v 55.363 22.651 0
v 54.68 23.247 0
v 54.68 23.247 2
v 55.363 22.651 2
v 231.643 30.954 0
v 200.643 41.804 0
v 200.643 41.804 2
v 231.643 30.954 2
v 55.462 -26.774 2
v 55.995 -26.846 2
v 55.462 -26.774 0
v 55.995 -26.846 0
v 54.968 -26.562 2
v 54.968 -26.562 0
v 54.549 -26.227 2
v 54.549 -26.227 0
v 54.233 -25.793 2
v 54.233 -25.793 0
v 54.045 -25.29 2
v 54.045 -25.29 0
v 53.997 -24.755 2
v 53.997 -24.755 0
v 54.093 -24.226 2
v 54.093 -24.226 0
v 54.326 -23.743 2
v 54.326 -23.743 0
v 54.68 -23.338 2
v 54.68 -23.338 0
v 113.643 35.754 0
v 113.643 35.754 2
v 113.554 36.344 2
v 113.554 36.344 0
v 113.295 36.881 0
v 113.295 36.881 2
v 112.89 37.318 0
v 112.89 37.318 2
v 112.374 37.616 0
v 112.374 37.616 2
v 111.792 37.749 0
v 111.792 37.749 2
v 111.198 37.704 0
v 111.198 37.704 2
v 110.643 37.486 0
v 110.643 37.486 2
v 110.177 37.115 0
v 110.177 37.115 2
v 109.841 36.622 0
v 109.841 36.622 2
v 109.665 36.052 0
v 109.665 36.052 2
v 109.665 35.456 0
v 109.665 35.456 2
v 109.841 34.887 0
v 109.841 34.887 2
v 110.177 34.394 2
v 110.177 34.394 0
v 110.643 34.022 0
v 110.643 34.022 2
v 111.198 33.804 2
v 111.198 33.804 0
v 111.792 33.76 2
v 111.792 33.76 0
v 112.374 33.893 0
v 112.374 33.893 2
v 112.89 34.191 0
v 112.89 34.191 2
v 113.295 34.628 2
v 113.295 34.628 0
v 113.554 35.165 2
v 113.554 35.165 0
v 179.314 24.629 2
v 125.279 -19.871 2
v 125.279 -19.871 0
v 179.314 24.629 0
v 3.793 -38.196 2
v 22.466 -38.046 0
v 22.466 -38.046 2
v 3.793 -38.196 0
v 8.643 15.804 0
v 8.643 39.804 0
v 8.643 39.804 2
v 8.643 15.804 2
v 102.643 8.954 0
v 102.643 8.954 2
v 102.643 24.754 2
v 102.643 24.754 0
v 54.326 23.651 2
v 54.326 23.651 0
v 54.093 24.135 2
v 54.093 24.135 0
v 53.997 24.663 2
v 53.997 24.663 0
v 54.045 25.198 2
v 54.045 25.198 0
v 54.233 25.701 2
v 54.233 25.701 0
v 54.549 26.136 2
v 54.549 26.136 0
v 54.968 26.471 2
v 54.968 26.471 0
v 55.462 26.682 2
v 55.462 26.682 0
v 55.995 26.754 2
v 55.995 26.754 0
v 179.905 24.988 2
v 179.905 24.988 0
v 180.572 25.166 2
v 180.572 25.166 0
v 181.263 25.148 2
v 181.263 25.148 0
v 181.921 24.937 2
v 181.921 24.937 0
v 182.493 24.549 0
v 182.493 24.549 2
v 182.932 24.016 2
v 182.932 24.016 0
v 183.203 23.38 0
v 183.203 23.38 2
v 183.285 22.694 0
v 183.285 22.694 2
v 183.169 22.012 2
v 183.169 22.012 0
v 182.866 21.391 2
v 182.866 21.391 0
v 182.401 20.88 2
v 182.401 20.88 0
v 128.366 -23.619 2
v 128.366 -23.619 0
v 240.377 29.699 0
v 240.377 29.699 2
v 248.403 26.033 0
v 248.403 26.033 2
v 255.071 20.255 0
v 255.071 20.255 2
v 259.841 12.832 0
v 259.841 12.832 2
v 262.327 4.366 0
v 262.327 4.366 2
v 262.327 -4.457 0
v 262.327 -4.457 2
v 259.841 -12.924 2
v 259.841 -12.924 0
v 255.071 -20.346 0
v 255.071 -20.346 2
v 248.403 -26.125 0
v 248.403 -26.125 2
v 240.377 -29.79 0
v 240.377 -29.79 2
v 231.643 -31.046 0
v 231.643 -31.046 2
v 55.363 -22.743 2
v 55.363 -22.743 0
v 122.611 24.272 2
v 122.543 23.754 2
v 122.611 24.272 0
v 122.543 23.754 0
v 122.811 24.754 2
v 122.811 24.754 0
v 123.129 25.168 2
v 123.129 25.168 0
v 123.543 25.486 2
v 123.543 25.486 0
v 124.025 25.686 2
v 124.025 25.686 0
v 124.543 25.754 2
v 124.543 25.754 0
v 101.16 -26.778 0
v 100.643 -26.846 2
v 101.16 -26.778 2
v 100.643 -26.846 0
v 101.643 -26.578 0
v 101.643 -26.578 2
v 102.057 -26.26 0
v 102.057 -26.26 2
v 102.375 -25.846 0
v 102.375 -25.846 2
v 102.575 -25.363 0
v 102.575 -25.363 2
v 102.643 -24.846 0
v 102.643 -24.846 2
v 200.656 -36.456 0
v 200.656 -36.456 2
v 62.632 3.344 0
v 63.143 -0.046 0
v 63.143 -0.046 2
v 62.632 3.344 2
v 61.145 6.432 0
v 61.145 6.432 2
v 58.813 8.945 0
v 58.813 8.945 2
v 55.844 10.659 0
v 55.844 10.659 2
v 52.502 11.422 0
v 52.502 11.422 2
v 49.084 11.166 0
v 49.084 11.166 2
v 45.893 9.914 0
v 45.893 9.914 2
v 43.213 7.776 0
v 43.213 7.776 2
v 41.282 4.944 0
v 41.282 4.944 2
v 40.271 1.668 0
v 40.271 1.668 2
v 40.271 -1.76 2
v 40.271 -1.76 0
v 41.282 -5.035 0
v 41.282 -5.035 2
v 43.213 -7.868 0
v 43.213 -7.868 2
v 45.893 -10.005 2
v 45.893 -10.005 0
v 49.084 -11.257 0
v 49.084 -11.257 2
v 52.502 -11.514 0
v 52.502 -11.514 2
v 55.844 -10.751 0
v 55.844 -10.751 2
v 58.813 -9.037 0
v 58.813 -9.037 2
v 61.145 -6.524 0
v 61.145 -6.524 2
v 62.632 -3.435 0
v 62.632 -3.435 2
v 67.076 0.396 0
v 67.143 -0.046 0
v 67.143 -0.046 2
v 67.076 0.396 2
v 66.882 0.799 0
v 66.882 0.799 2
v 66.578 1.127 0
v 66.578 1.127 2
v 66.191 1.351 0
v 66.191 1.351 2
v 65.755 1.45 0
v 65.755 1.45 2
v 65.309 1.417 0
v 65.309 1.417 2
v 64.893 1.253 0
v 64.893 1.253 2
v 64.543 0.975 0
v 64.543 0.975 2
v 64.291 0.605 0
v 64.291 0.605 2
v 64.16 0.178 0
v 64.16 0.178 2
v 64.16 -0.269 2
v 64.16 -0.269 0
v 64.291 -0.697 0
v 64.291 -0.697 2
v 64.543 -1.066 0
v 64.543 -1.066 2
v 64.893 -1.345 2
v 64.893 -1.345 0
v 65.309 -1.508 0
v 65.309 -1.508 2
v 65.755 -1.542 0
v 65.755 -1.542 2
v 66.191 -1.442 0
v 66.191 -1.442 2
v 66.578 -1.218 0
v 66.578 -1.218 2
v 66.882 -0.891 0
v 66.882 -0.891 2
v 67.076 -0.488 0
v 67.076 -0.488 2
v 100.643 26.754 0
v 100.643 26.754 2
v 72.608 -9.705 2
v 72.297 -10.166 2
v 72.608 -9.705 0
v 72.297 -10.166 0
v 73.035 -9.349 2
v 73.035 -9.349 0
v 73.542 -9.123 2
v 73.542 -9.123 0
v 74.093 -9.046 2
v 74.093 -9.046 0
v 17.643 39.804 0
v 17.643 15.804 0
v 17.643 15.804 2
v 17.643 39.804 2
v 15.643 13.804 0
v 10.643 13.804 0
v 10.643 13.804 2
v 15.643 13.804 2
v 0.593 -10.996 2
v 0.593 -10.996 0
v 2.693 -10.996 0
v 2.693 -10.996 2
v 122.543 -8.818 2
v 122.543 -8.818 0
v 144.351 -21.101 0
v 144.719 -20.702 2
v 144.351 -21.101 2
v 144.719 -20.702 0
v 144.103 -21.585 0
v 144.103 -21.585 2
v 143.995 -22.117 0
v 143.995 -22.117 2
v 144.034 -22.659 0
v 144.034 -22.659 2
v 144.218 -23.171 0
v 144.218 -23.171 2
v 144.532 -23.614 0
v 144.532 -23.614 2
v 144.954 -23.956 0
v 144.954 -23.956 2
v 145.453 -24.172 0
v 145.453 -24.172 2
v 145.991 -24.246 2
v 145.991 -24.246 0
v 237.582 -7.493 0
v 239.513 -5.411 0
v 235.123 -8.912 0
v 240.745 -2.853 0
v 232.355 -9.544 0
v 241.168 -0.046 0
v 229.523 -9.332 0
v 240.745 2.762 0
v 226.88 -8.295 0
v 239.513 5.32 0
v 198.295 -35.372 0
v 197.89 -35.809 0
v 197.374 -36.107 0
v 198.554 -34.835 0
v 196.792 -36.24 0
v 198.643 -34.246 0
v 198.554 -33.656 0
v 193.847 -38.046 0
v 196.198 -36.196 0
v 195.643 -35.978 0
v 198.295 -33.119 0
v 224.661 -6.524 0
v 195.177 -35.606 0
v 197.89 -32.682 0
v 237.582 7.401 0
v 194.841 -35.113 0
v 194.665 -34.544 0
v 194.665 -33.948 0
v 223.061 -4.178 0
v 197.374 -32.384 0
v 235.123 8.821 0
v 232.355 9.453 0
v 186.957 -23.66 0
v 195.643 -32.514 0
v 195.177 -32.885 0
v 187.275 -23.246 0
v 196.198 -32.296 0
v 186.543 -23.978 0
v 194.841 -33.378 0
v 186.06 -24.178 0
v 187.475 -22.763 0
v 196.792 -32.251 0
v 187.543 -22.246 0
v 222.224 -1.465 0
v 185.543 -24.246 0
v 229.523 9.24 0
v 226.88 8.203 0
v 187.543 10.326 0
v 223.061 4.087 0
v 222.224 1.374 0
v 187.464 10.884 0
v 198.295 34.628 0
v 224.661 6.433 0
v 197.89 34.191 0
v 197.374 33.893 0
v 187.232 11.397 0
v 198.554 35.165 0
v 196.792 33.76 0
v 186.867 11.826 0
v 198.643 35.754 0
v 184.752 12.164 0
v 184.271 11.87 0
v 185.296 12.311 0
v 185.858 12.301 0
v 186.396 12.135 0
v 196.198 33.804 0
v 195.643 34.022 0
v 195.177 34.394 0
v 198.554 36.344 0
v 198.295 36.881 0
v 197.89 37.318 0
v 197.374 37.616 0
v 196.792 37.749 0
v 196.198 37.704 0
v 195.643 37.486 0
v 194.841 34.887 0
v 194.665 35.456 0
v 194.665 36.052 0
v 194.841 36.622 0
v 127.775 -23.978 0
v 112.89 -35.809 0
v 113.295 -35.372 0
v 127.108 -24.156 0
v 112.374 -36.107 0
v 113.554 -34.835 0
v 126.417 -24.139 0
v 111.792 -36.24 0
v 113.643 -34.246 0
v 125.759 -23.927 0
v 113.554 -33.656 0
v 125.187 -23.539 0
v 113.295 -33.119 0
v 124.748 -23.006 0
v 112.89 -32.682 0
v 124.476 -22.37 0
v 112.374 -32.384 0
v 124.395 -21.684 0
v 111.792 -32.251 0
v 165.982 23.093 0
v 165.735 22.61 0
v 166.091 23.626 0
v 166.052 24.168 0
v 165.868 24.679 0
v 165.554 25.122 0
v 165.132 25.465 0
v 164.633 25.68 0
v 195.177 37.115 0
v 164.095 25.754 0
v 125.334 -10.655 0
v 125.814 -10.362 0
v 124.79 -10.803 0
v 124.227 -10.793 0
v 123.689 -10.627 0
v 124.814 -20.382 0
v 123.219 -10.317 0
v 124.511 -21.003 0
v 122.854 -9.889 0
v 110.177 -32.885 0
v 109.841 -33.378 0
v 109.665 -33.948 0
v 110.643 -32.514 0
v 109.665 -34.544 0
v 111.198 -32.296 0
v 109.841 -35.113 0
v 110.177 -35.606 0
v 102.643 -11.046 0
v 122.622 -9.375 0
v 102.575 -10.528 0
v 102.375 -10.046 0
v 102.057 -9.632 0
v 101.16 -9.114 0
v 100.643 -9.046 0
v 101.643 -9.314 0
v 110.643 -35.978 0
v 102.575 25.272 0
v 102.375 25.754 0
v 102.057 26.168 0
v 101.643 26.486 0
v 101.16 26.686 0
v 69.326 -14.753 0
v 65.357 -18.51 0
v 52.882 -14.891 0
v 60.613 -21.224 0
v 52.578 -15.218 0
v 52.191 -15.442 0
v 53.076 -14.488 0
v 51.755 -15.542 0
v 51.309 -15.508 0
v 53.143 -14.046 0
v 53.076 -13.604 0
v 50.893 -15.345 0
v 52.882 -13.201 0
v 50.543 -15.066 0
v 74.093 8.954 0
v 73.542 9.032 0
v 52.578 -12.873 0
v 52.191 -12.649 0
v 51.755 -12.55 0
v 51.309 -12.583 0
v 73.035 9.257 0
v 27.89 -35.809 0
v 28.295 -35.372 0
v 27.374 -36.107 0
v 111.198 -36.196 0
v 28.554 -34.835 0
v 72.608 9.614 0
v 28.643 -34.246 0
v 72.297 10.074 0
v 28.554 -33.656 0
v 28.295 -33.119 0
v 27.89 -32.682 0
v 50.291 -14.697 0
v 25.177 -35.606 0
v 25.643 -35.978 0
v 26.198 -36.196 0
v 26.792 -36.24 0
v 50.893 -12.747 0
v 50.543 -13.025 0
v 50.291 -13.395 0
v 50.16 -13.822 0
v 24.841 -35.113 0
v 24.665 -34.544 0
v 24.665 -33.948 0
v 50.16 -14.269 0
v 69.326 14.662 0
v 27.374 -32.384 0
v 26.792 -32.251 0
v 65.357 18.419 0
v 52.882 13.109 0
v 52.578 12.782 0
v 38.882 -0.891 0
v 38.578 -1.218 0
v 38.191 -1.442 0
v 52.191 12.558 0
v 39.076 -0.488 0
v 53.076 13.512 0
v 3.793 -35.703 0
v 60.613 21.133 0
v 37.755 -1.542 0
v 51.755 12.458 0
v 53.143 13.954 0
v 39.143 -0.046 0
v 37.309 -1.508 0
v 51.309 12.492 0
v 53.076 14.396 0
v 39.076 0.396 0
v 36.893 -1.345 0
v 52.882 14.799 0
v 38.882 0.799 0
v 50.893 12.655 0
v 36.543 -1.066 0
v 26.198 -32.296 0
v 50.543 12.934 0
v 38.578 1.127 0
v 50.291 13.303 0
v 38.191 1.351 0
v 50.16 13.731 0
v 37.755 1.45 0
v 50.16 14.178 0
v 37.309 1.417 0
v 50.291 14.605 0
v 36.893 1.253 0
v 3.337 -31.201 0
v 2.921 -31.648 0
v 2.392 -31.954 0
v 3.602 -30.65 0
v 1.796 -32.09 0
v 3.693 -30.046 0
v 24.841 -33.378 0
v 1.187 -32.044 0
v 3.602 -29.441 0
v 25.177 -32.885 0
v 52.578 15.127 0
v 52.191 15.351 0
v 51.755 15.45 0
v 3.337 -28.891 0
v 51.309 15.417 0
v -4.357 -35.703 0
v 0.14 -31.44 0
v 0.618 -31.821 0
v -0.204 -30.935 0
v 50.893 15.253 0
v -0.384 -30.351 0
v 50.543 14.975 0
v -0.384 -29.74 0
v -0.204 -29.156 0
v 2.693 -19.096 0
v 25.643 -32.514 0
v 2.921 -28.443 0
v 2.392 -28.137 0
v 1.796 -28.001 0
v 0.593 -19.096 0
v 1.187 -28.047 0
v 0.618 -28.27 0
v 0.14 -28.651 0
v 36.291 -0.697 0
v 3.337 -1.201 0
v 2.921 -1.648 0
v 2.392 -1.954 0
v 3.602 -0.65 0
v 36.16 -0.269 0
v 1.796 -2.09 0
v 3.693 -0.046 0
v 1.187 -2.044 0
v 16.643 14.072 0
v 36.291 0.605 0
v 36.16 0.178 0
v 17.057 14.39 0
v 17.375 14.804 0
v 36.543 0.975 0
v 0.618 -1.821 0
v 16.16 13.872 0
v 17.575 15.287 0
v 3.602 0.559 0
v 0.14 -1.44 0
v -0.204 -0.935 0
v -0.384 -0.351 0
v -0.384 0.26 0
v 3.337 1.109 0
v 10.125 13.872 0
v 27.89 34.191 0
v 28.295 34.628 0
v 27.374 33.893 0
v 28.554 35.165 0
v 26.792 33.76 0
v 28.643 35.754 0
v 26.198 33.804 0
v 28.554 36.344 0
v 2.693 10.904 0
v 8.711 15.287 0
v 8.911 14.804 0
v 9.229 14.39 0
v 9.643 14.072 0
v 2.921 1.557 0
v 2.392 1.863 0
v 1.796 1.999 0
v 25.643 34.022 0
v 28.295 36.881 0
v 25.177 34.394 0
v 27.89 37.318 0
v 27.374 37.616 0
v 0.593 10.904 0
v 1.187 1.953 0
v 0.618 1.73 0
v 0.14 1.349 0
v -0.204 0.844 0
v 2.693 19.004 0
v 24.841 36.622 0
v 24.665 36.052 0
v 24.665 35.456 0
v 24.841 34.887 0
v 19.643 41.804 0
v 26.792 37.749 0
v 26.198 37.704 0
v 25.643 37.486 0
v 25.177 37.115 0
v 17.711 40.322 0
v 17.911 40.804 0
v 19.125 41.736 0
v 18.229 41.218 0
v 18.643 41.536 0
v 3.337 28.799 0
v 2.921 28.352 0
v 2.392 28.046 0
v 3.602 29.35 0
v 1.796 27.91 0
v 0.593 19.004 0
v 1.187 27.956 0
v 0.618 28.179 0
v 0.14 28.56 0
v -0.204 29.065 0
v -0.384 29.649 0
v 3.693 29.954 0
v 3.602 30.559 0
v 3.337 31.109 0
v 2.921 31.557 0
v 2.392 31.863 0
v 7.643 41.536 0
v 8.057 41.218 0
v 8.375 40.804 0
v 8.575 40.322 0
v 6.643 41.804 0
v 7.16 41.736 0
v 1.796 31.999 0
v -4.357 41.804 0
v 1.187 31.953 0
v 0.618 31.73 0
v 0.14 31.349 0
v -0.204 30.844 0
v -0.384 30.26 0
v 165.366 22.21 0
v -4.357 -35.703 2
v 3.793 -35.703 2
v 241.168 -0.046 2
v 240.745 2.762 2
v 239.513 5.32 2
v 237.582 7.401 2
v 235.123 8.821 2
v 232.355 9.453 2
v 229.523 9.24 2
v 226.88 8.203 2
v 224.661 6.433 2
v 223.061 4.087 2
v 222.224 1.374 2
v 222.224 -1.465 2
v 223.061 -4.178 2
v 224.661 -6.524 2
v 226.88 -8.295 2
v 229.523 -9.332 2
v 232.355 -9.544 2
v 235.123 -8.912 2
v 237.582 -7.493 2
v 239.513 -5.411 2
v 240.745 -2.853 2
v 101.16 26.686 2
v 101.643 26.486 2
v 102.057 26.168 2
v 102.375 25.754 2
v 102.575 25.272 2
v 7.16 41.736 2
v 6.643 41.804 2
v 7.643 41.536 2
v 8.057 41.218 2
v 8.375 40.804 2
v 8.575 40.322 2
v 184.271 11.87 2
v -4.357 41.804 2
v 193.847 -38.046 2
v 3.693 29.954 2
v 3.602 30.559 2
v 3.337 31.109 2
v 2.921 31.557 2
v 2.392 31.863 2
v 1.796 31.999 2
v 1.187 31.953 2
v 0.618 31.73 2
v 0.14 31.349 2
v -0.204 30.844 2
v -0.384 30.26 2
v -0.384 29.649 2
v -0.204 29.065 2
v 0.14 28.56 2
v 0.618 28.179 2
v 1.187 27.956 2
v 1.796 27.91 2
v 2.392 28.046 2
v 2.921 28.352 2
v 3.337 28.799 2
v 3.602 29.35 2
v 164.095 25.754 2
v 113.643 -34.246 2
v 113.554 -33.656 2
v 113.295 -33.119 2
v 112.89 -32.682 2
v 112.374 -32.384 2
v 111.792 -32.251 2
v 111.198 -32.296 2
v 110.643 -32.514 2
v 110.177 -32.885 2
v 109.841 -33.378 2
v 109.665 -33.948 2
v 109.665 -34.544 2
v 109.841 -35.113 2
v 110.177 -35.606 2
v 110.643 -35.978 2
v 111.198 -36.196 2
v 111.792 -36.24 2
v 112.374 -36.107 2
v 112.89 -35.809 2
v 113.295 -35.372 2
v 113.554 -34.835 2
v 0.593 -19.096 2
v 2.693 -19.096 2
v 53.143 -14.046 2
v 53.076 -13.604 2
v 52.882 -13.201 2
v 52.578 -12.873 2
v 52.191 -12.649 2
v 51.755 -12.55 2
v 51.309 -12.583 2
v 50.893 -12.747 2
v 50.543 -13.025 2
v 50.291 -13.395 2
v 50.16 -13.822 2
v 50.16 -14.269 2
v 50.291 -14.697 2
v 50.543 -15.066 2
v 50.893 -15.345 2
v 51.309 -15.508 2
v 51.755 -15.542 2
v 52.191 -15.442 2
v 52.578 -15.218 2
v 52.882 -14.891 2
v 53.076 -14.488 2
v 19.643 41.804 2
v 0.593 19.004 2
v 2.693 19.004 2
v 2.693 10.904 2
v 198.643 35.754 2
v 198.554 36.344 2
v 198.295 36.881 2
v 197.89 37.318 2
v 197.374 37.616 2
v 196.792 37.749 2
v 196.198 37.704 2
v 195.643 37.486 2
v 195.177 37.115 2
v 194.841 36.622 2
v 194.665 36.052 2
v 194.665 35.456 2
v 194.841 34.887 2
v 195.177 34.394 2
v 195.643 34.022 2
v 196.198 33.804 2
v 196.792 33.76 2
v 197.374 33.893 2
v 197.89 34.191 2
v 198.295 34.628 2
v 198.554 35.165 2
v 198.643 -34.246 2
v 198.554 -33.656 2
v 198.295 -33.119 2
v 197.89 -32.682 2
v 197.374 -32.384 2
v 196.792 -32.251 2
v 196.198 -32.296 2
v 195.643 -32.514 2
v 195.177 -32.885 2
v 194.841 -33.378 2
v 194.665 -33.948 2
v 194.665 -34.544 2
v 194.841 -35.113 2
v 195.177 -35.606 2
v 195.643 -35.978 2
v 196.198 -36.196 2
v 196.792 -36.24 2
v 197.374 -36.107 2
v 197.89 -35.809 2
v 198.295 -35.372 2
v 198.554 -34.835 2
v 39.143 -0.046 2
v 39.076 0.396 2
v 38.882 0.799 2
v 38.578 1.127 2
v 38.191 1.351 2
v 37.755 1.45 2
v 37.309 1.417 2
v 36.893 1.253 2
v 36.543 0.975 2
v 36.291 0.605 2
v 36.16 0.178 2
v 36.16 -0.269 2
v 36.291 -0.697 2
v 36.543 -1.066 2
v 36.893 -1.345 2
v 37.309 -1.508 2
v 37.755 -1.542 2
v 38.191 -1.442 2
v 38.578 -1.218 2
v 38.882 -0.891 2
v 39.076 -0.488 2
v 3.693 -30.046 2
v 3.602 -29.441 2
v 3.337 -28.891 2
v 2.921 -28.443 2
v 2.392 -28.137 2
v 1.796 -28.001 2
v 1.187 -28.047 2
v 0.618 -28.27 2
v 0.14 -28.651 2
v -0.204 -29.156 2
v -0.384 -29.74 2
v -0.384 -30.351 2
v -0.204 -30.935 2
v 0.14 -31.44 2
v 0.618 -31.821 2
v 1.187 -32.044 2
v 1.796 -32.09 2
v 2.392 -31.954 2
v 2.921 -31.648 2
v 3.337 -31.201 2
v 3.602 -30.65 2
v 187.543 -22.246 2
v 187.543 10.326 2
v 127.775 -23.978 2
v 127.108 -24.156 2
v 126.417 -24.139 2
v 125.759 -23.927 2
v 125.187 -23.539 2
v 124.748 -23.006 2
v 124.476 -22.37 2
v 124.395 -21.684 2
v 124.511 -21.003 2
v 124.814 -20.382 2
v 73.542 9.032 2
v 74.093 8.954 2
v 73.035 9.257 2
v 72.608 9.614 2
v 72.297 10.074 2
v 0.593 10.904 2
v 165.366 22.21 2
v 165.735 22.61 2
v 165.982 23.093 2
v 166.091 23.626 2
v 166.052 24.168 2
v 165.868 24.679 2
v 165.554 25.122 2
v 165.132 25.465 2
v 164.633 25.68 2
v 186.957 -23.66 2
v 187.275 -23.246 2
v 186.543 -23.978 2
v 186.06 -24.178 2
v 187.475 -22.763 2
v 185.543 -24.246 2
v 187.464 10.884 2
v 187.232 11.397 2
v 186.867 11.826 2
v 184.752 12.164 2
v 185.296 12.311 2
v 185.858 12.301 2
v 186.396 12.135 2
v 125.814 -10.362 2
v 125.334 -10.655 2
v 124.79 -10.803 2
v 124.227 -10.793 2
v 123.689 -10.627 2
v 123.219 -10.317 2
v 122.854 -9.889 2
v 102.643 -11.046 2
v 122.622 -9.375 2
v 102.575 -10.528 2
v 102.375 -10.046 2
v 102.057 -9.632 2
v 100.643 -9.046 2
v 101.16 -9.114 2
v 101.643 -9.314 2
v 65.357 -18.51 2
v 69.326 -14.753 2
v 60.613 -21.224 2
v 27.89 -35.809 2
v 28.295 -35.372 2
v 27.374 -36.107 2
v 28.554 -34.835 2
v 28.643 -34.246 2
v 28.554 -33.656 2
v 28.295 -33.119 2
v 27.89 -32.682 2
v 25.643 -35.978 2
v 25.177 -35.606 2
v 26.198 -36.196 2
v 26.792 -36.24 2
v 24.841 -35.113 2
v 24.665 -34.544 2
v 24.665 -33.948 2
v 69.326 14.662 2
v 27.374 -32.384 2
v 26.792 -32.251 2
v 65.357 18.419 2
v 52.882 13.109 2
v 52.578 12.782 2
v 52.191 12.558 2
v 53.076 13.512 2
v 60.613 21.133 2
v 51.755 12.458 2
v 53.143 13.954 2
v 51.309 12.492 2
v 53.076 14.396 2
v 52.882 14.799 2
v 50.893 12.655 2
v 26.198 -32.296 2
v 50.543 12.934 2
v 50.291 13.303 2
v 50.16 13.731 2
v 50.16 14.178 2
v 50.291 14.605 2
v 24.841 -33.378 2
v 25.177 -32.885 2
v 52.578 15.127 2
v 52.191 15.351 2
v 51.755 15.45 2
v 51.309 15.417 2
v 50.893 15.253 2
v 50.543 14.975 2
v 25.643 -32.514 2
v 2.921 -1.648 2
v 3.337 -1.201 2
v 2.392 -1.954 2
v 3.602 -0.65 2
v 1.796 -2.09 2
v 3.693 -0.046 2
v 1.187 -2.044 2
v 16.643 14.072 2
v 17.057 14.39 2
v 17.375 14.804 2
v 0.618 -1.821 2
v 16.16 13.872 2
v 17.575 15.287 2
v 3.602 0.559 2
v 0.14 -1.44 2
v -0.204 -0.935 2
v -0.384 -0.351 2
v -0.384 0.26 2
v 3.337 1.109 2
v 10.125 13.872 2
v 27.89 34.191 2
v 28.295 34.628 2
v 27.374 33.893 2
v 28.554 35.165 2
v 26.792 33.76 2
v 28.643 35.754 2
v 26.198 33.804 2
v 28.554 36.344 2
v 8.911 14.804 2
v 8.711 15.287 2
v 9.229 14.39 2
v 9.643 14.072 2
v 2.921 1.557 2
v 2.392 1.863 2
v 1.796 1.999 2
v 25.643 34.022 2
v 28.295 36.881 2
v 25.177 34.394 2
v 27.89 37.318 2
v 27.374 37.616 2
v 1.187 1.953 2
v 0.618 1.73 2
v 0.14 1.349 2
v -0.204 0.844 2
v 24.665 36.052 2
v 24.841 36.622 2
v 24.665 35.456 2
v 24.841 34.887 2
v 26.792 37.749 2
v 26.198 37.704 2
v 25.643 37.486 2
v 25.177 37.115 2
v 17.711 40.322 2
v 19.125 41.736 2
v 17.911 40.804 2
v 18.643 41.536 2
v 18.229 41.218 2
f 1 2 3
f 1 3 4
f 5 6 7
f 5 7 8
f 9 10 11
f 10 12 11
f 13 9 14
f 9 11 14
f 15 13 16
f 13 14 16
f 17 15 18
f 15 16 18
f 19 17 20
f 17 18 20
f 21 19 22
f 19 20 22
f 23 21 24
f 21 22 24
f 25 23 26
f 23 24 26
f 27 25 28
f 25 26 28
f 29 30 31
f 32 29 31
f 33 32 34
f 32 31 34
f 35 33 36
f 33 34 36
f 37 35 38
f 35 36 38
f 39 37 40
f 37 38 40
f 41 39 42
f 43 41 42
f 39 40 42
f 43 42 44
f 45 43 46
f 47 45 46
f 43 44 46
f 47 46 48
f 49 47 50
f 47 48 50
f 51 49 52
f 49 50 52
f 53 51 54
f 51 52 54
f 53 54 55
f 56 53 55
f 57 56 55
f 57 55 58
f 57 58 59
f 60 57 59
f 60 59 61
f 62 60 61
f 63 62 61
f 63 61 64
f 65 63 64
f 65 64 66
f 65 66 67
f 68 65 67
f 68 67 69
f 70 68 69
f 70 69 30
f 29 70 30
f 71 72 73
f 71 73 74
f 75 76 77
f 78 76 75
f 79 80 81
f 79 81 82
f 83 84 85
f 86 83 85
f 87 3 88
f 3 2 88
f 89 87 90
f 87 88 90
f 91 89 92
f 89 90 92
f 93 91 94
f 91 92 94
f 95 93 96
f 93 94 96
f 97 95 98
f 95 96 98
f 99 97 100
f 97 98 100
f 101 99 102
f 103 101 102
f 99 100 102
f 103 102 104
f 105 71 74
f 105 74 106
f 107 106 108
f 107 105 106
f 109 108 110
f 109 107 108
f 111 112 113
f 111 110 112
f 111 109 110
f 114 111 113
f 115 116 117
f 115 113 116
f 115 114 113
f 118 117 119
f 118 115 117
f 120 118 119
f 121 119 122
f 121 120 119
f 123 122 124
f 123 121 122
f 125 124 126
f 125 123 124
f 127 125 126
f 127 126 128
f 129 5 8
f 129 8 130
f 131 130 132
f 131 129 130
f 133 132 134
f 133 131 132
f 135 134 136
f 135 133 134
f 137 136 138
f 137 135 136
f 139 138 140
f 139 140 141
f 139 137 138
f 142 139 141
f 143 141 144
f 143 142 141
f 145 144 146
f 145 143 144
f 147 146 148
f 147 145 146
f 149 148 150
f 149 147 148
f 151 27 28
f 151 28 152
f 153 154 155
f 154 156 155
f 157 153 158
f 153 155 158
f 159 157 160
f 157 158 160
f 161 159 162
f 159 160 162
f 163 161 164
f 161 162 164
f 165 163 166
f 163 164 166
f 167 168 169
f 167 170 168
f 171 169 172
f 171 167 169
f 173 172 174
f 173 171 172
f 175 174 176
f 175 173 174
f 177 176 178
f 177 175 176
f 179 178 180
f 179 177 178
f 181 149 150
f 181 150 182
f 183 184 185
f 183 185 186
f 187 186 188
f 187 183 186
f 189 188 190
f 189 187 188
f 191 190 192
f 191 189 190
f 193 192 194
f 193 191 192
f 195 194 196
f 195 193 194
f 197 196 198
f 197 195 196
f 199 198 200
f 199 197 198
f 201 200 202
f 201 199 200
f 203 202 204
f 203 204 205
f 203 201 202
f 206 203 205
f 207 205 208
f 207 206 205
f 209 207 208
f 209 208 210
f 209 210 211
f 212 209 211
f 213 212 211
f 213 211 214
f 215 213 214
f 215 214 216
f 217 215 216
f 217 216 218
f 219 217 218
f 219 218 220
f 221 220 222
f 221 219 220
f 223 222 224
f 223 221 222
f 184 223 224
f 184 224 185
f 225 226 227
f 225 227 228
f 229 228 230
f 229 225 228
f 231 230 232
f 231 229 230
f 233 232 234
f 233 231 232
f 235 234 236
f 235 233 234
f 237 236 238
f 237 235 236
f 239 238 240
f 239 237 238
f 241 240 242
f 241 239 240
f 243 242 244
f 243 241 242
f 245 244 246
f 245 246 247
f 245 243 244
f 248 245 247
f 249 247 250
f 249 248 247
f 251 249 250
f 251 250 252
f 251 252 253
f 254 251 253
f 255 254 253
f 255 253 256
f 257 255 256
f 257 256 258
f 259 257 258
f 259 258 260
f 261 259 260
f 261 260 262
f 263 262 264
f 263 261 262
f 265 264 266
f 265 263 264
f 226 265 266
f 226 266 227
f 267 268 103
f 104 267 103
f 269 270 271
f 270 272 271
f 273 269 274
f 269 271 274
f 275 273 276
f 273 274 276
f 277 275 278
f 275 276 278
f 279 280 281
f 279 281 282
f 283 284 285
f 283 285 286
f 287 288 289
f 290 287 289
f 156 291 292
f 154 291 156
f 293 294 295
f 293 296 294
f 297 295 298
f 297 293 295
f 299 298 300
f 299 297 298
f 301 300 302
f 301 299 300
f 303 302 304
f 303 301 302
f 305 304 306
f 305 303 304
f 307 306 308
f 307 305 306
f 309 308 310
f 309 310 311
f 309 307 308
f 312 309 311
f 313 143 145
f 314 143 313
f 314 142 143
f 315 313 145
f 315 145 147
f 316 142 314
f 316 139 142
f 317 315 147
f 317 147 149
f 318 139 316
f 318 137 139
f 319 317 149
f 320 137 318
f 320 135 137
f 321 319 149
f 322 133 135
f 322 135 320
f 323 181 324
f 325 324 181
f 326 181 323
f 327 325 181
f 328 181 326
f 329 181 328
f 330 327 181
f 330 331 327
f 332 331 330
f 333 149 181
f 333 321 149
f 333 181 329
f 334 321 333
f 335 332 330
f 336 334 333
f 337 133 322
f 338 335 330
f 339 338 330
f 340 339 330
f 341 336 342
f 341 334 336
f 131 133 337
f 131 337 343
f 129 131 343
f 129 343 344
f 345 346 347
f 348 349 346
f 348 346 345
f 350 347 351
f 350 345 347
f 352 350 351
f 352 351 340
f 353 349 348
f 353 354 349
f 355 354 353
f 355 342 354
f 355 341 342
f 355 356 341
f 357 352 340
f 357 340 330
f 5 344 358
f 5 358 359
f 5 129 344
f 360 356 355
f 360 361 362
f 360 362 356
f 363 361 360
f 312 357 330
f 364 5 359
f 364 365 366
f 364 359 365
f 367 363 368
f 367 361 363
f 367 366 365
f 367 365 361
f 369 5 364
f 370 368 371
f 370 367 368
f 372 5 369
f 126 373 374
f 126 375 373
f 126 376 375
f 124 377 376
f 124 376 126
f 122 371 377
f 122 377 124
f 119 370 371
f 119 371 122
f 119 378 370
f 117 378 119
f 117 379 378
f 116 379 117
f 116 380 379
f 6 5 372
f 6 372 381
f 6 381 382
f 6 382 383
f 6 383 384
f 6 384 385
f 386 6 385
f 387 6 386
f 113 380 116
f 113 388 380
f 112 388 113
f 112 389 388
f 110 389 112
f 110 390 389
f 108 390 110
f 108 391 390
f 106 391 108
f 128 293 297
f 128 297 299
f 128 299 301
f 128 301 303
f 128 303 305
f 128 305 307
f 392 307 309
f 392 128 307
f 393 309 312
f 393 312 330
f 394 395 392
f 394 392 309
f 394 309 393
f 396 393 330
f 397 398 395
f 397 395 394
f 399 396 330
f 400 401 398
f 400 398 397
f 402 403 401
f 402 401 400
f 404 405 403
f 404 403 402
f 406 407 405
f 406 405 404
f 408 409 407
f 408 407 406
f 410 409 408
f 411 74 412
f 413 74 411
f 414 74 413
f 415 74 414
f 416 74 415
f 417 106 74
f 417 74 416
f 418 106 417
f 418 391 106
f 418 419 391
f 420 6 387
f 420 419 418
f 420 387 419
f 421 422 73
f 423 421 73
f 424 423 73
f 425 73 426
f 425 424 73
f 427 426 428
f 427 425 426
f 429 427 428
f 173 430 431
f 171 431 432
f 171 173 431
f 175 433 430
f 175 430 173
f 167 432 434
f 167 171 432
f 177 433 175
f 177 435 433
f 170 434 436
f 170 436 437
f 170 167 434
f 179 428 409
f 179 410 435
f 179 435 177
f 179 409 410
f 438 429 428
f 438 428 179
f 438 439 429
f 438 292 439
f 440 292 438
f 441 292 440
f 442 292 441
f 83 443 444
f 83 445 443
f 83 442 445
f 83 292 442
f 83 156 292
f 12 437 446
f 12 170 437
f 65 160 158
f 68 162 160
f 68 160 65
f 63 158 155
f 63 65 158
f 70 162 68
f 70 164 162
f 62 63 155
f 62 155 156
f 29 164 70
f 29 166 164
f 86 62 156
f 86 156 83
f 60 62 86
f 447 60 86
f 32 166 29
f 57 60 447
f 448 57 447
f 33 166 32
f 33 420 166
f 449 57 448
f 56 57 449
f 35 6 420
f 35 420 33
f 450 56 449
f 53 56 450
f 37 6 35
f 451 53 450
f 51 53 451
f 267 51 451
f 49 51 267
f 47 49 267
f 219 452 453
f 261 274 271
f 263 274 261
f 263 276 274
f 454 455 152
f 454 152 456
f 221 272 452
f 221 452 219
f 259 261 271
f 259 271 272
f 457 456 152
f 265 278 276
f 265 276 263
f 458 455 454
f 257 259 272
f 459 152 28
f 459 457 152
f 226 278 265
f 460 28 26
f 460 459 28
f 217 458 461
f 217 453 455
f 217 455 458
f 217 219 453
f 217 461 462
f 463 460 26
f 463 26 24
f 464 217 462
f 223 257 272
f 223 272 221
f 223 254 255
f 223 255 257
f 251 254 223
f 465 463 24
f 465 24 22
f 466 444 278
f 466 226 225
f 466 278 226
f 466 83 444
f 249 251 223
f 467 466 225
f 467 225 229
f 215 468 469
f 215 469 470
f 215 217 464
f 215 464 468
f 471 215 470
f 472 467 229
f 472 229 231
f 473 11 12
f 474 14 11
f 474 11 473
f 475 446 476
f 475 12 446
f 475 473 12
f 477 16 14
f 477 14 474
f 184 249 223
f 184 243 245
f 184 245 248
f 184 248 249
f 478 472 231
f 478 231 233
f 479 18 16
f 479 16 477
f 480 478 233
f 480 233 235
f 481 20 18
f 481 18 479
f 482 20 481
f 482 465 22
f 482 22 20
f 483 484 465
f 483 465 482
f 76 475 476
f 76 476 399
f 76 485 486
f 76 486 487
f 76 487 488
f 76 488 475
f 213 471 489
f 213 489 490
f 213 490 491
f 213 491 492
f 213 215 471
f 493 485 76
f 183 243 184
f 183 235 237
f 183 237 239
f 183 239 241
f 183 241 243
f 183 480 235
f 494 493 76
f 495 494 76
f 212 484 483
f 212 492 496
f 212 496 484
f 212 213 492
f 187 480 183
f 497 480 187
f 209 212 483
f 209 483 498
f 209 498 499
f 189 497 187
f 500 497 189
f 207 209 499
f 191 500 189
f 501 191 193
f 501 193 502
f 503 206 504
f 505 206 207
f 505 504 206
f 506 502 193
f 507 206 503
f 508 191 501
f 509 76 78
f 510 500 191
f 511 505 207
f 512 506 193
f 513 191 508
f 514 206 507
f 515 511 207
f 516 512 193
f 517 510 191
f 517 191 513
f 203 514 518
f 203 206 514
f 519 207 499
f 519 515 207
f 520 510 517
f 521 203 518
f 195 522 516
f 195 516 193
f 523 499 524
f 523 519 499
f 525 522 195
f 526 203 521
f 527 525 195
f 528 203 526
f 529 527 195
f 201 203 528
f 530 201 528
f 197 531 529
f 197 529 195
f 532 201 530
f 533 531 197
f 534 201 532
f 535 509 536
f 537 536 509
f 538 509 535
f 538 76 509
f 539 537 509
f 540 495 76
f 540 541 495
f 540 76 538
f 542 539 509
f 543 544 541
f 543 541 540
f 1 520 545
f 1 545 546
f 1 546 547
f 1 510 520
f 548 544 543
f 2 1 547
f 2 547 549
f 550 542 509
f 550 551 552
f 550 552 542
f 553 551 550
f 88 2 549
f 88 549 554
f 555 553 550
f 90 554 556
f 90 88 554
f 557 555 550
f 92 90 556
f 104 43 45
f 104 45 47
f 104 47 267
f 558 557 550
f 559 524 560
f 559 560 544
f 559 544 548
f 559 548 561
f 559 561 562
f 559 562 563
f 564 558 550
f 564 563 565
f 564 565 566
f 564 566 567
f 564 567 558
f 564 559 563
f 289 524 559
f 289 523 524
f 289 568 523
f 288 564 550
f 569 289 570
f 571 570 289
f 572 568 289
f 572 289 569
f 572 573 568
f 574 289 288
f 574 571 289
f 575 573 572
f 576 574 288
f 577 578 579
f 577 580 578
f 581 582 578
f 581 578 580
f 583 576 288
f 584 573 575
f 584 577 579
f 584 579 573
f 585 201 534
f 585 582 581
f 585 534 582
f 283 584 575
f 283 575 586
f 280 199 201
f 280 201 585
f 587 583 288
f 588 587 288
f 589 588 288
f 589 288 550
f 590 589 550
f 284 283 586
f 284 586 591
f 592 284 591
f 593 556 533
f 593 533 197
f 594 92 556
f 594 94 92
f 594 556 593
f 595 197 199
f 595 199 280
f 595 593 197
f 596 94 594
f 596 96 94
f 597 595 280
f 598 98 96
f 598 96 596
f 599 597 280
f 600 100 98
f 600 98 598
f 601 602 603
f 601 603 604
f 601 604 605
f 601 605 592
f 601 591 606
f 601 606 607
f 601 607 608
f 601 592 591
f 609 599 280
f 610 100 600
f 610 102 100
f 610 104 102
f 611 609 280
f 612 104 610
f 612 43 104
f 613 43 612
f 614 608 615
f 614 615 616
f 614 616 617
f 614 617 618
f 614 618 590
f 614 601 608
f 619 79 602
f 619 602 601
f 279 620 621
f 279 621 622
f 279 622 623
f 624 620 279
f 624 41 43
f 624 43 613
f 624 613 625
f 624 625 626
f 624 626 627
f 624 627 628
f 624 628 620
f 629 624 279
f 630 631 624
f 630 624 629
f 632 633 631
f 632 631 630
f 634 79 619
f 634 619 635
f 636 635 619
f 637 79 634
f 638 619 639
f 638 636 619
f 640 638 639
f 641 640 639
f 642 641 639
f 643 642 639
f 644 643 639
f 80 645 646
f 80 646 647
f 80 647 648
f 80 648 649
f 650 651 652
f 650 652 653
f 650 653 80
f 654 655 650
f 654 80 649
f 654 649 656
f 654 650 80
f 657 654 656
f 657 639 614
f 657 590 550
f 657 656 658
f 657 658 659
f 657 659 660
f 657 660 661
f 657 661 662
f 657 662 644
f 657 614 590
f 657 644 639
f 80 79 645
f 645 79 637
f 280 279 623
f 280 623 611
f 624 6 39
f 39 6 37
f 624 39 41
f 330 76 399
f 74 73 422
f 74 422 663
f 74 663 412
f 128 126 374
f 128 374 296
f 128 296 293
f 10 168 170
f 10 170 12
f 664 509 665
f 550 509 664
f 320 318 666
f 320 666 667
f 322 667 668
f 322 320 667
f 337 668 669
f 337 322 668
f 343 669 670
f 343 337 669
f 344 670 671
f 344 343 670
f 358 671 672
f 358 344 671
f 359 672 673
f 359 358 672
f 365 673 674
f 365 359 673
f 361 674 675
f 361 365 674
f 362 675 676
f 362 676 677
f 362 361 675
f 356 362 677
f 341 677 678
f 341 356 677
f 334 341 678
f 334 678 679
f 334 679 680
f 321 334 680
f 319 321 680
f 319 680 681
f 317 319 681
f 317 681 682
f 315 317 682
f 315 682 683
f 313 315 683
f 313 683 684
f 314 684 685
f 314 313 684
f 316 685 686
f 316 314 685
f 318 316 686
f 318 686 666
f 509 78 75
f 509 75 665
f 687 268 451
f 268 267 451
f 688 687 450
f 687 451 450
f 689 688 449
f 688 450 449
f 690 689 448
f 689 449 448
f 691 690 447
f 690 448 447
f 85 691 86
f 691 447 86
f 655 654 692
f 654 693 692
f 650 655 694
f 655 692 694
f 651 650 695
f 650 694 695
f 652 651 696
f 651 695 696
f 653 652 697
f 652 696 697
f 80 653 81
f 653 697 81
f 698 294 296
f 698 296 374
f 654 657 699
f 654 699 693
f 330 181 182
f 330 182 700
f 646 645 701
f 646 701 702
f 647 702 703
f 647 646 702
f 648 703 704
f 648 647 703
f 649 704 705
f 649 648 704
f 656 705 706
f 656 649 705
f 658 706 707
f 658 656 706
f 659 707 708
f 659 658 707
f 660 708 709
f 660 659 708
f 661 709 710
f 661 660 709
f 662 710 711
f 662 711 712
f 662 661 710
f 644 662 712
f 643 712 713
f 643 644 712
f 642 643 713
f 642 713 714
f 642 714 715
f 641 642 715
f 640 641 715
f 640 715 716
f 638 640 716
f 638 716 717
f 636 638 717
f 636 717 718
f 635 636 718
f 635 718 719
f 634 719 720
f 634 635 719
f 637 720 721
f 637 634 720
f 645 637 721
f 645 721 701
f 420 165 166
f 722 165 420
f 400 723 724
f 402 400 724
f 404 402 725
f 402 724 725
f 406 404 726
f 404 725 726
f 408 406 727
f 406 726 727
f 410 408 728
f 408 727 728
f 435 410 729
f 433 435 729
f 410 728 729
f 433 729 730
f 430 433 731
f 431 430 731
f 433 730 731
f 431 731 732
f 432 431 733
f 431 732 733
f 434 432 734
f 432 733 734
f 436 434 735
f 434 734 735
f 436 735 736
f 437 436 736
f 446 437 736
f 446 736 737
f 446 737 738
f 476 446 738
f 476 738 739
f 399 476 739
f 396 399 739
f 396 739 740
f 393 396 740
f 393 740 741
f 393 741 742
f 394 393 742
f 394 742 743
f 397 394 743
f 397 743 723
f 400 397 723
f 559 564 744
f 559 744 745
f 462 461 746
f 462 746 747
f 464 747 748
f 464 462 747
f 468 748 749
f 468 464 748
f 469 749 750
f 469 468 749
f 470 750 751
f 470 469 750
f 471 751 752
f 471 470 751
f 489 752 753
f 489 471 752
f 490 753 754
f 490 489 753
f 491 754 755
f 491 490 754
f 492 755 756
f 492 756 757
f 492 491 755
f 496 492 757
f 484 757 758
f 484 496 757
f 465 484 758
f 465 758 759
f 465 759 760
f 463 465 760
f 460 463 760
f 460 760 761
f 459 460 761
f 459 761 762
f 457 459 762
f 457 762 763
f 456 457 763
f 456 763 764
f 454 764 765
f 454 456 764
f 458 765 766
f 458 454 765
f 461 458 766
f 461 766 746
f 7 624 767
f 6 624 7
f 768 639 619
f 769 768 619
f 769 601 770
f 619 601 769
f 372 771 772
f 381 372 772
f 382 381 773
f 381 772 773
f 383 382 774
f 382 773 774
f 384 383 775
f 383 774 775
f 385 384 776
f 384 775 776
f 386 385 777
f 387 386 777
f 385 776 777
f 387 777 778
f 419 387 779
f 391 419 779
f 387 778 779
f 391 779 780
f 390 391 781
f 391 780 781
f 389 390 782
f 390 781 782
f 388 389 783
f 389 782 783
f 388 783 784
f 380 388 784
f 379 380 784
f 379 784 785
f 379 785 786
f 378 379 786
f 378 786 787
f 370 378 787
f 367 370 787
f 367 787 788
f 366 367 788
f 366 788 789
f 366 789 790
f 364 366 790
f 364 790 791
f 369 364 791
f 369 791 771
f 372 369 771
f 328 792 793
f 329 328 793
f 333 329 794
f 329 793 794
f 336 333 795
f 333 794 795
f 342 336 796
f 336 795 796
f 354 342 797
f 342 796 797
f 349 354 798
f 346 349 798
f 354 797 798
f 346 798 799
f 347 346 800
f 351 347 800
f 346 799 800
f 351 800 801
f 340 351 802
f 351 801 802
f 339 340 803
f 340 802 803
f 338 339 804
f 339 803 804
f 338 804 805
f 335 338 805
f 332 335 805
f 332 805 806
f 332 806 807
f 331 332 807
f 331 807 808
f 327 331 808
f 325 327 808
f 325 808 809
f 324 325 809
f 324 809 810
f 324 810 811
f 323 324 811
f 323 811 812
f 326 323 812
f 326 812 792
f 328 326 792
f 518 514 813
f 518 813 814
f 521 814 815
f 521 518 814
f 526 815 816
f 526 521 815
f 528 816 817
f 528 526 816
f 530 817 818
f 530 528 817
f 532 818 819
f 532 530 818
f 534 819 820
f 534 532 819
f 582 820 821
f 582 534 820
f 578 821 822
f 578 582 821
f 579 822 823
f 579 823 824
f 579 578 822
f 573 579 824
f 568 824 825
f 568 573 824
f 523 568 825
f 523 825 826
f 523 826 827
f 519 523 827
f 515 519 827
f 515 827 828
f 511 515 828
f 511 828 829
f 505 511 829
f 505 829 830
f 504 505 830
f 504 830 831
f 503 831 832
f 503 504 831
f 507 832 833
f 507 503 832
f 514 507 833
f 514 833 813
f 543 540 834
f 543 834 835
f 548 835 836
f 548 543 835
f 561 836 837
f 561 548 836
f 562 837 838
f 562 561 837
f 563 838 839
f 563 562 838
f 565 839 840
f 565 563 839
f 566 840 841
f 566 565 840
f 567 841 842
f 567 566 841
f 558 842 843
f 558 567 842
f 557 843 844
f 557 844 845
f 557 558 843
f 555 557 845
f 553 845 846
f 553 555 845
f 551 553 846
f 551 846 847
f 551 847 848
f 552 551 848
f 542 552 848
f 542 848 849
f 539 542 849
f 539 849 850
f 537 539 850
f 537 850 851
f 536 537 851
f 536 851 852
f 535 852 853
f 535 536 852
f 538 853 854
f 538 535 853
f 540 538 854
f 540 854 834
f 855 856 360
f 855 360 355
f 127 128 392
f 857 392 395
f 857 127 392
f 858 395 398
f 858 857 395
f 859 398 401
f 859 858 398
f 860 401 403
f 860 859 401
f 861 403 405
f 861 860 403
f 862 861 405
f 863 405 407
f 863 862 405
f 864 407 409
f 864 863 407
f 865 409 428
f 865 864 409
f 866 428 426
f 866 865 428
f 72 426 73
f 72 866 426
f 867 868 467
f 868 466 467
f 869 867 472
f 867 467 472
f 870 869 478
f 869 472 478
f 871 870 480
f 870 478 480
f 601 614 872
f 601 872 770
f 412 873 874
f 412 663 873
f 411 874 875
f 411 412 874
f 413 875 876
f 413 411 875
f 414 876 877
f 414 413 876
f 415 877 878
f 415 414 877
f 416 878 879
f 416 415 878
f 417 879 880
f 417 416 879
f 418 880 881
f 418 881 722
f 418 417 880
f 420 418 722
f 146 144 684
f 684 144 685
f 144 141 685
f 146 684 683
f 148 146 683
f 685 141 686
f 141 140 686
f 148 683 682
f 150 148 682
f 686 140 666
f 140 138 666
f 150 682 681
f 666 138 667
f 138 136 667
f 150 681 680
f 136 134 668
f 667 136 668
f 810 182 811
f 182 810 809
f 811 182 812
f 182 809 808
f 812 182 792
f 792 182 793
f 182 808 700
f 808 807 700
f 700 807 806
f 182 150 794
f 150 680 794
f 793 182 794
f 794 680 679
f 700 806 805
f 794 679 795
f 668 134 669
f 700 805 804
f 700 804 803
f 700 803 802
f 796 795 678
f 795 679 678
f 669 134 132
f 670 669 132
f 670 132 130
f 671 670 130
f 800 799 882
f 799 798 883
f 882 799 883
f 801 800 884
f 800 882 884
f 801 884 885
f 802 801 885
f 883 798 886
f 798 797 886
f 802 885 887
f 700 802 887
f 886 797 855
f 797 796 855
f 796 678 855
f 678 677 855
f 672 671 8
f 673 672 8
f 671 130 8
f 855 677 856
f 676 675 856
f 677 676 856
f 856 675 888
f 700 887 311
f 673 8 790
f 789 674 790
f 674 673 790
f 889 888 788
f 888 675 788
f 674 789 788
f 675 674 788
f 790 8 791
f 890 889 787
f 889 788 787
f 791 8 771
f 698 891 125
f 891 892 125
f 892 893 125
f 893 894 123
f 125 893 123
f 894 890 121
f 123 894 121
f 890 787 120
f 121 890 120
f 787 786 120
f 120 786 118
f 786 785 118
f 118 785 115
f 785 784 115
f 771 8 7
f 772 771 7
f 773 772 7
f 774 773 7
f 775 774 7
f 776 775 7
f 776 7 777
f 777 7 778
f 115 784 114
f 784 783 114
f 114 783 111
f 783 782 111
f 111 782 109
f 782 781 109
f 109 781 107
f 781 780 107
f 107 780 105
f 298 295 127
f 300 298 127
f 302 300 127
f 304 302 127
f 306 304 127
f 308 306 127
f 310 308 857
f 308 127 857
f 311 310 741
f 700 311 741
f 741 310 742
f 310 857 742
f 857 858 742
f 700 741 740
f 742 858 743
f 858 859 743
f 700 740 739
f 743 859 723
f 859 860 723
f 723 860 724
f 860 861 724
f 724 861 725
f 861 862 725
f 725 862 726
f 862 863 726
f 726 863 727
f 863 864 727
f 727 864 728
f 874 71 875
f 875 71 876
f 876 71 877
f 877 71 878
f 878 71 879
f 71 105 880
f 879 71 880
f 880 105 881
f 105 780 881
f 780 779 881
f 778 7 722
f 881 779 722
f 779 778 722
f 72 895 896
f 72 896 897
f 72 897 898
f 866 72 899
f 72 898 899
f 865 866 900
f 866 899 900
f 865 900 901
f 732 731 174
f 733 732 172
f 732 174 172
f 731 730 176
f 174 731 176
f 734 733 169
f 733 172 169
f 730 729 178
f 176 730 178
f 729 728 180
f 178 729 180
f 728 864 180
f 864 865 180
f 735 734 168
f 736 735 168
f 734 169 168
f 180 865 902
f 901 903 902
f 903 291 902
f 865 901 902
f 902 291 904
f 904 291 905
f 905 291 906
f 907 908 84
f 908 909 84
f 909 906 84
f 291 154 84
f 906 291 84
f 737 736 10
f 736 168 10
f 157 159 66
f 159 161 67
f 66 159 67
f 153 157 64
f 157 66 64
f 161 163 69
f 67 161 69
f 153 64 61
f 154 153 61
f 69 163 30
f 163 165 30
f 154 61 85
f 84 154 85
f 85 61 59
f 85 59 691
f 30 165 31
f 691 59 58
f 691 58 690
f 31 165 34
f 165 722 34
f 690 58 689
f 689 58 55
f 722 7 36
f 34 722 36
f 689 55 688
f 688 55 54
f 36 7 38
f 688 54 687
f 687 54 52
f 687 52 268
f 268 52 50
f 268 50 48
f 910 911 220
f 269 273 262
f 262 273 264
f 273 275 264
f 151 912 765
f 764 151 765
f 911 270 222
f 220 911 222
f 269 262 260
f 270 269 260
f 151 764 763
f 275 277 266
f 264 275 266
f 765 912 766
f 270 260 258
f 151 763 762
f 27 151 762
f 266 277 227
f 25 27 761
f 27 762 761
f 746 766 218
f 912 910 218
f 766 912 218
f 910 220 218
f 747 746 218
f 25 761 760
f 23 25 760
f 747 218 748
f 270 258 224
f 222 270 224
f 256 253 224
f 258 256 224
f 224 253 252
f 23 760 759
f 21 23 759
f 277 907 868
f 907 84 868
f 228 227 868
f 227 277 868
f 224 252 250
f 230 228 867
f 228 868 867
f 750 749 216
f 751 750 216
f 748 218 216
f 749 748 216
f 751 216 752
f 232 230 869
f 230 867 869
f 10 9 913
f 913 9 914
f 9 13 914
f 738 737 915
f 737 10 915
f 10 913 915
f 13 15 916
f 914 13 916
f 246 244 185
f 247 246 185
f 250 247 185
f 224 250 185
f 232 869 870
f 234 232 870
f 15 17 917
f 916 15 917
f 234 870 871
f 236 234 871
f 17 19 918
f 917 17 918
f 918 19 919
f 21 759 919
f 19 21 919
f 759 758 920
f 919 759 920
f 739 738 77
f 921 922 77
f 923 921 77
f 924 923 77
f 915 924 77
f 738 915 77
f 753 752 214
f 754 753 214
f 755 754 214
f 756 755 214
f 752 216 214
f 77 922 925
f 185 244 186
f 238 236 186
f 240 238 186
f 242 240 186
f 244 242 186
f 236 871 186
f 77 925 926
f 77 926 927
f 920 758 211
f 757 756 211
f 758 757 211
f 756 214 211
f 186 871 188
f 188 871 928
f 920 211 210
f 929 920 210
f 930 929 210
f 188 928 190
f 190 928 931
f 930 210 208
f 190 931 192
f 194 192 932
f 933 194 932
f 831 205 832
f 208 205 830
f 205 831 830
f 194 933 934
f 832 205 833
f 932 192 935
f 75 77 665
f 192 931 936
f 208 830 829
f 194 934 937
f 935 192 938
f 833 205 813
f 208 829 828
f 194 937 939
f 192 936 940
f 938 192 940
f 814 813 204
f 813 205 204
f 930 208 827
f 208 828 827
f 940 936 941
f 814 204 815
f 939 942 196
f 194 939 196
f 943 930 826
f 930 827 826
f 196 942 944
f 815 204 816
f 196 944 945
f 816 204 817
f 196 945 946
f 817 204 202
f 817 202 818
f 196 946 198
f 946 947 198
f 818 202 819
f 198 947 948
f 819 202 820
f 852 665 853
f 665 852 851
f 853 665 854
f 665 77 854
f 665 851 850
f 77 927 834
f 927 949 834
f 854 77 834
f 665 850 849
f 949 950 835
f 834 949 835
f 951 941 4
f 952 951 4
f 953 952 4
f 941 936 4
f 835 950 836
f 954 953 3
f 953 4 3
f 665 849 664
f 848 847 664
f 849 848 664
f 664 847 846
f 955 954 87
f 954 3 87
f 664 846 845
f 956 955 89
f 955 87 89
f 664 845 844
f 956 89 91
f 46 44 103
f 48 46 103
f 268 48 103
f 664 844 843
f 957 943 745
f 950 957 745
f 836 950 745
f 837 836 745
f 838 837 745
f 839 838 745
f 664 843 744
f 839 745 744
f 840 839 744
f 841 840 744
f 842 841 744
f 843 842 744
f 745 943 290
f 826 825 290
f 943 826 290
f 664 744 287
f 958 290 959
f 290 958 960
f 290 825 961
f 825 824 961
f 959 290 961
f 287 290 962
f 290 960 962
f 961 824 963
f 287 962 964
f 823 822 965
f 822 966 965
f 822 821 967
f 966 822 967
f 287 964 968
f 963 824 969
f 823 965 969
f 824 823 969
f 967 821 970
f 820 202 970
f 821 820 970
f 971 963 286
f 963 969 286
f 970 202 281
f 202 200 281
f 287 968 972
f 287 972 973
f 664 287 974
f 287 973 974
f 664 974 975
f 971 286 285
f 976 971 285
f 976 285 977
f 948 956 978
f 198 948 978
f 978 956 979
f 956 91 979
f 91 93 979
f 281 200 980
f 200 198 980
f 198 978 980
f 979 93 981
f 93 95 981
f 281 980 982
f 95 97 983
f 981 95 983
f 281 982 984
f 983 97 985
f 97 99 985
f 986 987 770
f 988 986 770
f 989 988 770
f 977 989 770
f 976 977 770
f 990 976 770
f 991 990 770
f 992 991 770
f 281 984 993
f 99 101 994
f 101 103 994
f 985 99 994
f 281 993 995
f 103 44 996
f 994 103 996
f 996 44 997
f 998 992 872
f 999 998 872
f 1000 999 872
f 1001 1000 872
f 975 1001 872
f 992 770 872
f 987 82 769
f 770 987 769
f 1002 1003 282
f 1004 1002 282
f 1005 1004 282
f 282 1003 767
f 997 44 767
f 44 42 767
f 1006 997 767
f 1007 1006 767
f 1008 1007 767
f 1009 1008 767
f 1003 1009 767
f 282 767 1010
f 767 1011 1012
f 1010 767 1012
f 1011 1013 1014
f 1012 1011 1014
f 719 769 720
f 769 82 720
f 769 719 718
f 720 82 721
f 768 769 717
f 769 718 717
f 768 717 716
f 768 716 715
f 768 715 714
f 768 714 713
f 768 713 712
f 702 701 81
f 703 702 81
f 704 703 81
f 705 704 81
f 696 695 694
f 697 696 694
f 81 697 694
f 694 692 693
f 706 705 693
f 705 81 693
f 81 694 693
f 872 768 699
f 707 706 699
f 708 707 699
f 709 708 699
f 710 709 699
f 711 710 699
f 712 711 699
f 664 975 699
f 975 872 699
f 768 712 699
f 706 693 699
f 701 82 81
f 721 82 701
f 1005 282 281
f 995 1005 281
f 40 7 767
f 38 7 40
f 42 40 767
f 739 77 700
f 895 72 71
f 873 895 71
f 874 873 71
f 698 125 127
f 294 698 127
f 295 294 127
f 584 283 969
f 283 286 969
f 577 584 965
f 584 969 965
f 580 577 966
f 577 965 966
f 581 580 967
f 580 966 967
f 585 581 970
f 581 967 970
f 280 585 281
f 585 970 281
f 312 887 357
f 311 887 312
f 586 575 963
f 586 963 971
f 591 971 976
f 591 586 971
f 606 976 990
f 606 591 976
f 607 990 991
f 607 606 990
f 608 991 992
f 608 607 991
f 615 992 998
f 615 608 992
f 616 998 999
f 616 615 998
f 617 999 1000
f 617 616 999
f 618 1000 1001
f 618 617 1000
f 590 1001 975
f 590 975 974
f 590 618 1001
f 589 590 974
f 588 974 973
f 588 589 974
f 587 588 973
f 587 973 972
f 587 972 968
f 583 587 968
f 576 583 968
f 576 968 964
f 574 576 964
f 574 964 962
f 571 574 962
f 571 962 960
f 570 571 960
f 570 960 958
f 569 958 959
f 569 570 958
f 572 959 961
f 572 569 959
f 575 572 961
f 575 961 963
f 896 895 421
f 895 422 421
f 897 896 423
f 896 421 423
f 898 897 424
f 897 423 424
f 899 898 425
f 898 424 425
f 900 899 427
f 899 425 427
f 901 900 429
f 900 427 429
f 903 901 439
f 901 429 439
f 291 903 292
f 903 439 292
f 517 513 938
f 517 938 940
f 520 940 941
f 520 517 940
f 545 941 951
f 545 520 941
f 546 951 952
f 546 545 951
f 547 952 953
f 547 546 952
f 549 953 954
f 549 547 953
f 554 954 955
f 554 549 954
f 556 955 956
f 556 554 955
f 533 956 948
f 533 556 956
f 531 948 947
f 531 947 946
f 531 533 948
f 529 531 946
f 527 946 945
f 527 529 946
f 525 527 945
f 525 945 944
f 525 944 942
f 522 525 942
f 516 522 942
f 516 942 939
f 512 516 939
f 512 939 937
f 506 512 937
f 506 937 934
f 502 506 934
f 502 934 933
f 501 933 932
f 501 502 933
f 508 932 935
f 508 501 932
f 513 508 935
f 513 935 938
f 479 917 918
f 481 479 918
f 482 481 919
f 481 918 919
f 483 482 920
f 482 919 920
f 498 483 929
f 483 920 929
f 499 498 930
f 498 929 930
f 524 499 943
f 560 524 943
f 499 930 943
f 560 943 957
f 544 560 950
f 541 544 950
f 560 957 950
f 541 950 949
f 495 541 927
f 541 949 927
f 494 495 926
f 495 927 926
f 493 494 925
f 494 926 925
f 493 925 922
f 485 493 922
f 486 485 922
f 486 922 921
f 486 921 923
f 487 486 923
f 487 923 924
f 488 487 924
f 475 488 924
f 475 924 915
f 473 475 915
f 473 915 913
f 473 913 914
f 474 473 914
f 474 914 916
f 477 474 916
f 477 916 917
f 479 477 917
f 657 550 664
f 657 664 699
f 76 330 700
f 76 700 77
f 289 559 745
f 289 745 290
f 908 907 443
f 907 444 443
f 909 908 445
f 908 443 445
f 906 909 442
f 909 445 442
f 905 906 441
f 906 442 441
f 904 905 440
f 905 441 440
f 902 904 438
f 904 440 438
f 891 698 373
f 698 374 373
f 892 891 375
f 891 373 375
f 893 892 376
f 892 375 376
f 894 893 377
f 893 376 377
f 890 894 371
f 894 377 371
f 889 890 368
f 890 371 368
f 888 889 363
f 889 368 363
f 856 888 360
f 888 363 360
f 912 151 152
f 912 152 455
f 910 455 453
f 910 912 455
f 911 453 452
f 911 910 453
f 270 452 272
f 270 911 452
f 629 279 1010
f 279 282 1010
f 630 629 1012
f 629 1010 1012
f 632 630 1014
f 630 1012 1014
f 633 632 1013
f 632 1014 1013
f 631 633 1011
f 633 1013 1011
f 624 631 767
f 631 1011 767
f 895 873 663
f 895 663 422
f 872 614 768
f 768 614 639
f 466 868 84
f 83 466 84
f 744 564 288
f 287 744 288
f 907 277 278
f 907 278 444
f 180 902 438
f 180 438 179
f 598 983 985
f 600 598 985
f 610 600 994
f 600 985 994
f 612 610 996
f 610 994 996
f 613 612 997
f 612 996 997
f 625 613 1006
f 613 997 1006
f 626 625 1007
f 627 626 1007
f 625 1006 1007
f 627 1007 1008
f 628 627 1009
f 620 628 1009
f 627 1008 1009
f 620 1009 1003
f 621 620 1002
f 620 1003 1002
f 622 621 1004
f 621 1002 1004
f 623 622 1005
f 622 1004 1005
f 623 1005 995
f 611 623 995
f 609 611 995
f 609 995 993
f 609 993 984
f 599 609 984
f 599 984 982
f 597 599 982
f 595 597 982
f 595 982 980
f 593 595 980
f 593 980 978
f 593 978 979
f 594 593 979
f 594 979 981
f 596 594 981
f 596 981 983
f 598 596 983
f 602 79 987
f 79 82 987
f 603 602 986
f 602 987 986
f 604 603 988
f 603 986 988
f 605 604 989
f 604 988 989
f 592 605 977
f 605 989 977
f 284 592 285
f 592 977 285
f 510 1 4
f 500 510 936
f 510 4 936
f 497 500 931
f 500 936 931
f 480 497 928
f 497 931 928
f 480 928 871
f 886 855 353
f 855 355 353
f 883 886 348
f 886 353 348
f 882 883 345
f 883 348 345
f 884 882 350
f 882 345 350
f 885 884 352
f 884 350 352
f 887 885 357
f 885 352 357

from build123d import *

# Parameters (mm, degrees)
SKETCH_1_R          = 2.05
SKETCH_1_R_2        = 11.5
SKETCH_1_R_3        = 1.5
SKETCH_1_R_4        = 9.525
SKETCH_1_W          = 2.1
SKETCH_1_H          = 8.1
EXTRUDE_1_DEPTH     = 2
SKETCH_2_R          = 2
CUT_EXTRUDE_1_DEPTH = 4
FILLET_1_R          = 2


with BuildPart() as part:
    # 草图1 → 凸台-拉伸1 (new body)
    with BuildSketch(Plane.XY):
        with BuildLine():
            Line((-4.357142857, -0.045714286), (-4.357142857, 41.804285714))
            Line((-4.357142857, 41.804285714), (8.642857143, 41.804285714))
            Line((8.642857143, 41.804285714), (8.642857143, 13.804285714))
            Line((8.642857143, 13.804285714), (17.642857143, 13.804285714))
            Line((17.642857143, 13.804285714), (17.642857143, 41.804285714))
            Line((17.642857143, 41.804285714), (200.642857143, 41.804285714))
            Line((200.642857143, 41.804285714), (231.642857143, 30.954285714))
            ThreePointArc((231.642857143, 30.954285714), (262.642857143, -0.045714286), (231.642857143, -31.045714286))
            Line((231.642857143, -31.045714286), (200.656073527, -36.45591431))
            Line((200.656073527, -36.45591431), (193.846868021, -38.045714286))
            Line((193.846868021, -38.045714286), (22.465844759, -38.045714286))
            Line((22.465844759, -38.045714286), (3.792857143, -38.195714286))
            Line((3.792857143, -38.195714286), (3.792857143, -35.702553436))
            Line((3.792857143, -35.702553436), (-4.357142857, -35.702553436))
            Line((-4.357142857, -35.702553436), (-4.357142857, -0.045714286))
        make_face()
        with Locations((1.642857143, 29.954285714)):
            Circle(SKETCH_1_R, mode=Mode.SUBTRACT)
        with Locations((1.642857143, -0.045714286)):
            Circle(SKETCH_1_R, mode=Mode.SUBTRACT)
        with Locations((1.642857143, -30.045714286)):
            Circle(SKETCH_1_R, mode=Mode.SUBTRACT)
        with Locations((51.642857143, -0.045714286)):
            Circle(SKETCH_1_R_2, mode=Mode.SUBTRACT)
        with Locations((51.642857143, -14.045714286)):
            Circle(SKETCH_1_R_3, mode=Mode.SUBTRACT)
        with Locations((37.642857143, -0.045714286)):
            Circle(SKETCH_1_R_3, mode=Mode.SUBTRACT)
        with Locations((51.642857143, 13.954285714)):
            Circle(SKETCH_1_R_3, mode=Mode.SUBTRACT)
        with Locations((65.642857143, -0.045714286)):
            Circle(SKETCH_1_R_3, mode=Mode.SUBTRACT)
        with Locations((231.642857143, -0.045714286)):
            Circle(SKETCH_1_R_4, mode=Mode.SUBTRACT)
        with Locations((1.642857143, 14.954285714)):
            Rectangle(SKETCH_1_W, SKETCH_1_H, mode=Mode.SUBTRACT)
        with Locations((1.642857143, -15.045714286)):
            Rectangle(SKETCH_1_W, SKETCH_1_H, mode=Mode.SUBTRACT)
    extrude(amount=EXTRUDE_1_DEPTH)

    # 草图2 → 切除-拉伸1 (cut)
    with BuildSketch(Plane.XY.offset(2)):
        with Locations((26.642857143, 35.754285714)):
            Circle(SKETCH_2_R)
        with Locations((111.642857143, 35.754285714)):
            Circle(SKETCH_2_R)
        with Locations((196.642857143, 35.754285714)):
            Circle(SKETCH_2_R)
        with Locations((111.642857143, -34.245714286)):
            Circle(SKETCH_2_R)
        with Locations((196.642857143, -34.245714286)):
            Circle(SKETCH_2_R)
        with Locations((26.642857143, -34.245714286)):
            Circle(SKETCH_2_R)
        Polygon((187.542857143, -24.245714286), (140.41622539, -24.245714286), (187.542857143, 14.56445304), align=None)
        Polygon((122.542857143, 25.754285714), (169.669488896, 25.754285714), (122.542857143, -13.055881612), align=None)
        with BuildLine():
            Line((72.808867631, 8.954285714), (102.642857143, 8.954285714))
            Line((102.642857143, 8.954285714), (102.642857143, 26.754285714))
            Line((102.642857143, 26.754285714), (50.657939371, 26.754285714))
            Line((50.657939371, 26.754285714), (55.363054959, 22.651424922))
            ThreePointArc((55.363054959, 22.651424922), (65.846157695, 18.044787461), (72.808867631, 8.954285714))
        make_face()
        with BuildLine():
            Line((102.642857143, -9.045714286), (102.642857143, -26.845714286))
            Line((102.642857143, -26.845714286), (50.657939371, -26.845714286))
            Line((50.657939371, -26.845714286), (55.363054959, -22.742853493))
            ThreePointArc((55.363054959, -22.742853493), (65.846157695, -18.136216032), (72.808867631, -9.045714286))
            Line((72.808867631, -9.045714286), (102.642857143, -9.045714286))
        make_face()
        with BuildLine():
            Line((125.279005787, -19.870759717), (179.314122281, 24.628747983))
            ThreePointArc((179.314122281, 24.628747983), (182.731673921, 24.298017179), (182.400943117, 20.880465538))
            Line((182.400943117, 20.880465538), (128.365826624, -23.619042162))
            ThreePointArc((128.365826624, -23.619042162), (124.948274984, -23.288311358), (125.279005787, -19.870759717))
        make_face()
    extrude(amount=-CUT_EXTRUDE_1_DEPTH, mode=Mode.SUBTRACT)

    # 圆角1
    fillet_1_edges = [part.edges().sort_by_distance(p)[0] for p in [
        (72.808867631, 8.954285714, 1),
        (50.657939371, 26.754285714, 1),
        (102.642857143, 26.754285714, 1),
        (122.542857143, -13.055881612, 1),
        (122.542857143, 25.754285714, 1),
        (169.669488896, 25.754285714, 1),
        (187.542857143, 14.56445304, 1),
        (187.542857143, -24.245714286, 1),
        (140.41622539, -24.245714286, 1),
        (102.642857143, -26.845714286, 1),
        (50.657939371, -26.845714286, 1),
        (72.808867631, -9.045714286, 1),
        (102.642857143, -9.045714286, 1),
        (8.642857143, 41.804285714, 1),
        (8.642857143, 13.804285714, 1),
        (17.642857143, 13.804285714, 1),
        (17.642857143, 41.804285714, 1),
    ]]
    fillet(fillet_1_edges, radius=FILLET_1_R)


solid = part.part
